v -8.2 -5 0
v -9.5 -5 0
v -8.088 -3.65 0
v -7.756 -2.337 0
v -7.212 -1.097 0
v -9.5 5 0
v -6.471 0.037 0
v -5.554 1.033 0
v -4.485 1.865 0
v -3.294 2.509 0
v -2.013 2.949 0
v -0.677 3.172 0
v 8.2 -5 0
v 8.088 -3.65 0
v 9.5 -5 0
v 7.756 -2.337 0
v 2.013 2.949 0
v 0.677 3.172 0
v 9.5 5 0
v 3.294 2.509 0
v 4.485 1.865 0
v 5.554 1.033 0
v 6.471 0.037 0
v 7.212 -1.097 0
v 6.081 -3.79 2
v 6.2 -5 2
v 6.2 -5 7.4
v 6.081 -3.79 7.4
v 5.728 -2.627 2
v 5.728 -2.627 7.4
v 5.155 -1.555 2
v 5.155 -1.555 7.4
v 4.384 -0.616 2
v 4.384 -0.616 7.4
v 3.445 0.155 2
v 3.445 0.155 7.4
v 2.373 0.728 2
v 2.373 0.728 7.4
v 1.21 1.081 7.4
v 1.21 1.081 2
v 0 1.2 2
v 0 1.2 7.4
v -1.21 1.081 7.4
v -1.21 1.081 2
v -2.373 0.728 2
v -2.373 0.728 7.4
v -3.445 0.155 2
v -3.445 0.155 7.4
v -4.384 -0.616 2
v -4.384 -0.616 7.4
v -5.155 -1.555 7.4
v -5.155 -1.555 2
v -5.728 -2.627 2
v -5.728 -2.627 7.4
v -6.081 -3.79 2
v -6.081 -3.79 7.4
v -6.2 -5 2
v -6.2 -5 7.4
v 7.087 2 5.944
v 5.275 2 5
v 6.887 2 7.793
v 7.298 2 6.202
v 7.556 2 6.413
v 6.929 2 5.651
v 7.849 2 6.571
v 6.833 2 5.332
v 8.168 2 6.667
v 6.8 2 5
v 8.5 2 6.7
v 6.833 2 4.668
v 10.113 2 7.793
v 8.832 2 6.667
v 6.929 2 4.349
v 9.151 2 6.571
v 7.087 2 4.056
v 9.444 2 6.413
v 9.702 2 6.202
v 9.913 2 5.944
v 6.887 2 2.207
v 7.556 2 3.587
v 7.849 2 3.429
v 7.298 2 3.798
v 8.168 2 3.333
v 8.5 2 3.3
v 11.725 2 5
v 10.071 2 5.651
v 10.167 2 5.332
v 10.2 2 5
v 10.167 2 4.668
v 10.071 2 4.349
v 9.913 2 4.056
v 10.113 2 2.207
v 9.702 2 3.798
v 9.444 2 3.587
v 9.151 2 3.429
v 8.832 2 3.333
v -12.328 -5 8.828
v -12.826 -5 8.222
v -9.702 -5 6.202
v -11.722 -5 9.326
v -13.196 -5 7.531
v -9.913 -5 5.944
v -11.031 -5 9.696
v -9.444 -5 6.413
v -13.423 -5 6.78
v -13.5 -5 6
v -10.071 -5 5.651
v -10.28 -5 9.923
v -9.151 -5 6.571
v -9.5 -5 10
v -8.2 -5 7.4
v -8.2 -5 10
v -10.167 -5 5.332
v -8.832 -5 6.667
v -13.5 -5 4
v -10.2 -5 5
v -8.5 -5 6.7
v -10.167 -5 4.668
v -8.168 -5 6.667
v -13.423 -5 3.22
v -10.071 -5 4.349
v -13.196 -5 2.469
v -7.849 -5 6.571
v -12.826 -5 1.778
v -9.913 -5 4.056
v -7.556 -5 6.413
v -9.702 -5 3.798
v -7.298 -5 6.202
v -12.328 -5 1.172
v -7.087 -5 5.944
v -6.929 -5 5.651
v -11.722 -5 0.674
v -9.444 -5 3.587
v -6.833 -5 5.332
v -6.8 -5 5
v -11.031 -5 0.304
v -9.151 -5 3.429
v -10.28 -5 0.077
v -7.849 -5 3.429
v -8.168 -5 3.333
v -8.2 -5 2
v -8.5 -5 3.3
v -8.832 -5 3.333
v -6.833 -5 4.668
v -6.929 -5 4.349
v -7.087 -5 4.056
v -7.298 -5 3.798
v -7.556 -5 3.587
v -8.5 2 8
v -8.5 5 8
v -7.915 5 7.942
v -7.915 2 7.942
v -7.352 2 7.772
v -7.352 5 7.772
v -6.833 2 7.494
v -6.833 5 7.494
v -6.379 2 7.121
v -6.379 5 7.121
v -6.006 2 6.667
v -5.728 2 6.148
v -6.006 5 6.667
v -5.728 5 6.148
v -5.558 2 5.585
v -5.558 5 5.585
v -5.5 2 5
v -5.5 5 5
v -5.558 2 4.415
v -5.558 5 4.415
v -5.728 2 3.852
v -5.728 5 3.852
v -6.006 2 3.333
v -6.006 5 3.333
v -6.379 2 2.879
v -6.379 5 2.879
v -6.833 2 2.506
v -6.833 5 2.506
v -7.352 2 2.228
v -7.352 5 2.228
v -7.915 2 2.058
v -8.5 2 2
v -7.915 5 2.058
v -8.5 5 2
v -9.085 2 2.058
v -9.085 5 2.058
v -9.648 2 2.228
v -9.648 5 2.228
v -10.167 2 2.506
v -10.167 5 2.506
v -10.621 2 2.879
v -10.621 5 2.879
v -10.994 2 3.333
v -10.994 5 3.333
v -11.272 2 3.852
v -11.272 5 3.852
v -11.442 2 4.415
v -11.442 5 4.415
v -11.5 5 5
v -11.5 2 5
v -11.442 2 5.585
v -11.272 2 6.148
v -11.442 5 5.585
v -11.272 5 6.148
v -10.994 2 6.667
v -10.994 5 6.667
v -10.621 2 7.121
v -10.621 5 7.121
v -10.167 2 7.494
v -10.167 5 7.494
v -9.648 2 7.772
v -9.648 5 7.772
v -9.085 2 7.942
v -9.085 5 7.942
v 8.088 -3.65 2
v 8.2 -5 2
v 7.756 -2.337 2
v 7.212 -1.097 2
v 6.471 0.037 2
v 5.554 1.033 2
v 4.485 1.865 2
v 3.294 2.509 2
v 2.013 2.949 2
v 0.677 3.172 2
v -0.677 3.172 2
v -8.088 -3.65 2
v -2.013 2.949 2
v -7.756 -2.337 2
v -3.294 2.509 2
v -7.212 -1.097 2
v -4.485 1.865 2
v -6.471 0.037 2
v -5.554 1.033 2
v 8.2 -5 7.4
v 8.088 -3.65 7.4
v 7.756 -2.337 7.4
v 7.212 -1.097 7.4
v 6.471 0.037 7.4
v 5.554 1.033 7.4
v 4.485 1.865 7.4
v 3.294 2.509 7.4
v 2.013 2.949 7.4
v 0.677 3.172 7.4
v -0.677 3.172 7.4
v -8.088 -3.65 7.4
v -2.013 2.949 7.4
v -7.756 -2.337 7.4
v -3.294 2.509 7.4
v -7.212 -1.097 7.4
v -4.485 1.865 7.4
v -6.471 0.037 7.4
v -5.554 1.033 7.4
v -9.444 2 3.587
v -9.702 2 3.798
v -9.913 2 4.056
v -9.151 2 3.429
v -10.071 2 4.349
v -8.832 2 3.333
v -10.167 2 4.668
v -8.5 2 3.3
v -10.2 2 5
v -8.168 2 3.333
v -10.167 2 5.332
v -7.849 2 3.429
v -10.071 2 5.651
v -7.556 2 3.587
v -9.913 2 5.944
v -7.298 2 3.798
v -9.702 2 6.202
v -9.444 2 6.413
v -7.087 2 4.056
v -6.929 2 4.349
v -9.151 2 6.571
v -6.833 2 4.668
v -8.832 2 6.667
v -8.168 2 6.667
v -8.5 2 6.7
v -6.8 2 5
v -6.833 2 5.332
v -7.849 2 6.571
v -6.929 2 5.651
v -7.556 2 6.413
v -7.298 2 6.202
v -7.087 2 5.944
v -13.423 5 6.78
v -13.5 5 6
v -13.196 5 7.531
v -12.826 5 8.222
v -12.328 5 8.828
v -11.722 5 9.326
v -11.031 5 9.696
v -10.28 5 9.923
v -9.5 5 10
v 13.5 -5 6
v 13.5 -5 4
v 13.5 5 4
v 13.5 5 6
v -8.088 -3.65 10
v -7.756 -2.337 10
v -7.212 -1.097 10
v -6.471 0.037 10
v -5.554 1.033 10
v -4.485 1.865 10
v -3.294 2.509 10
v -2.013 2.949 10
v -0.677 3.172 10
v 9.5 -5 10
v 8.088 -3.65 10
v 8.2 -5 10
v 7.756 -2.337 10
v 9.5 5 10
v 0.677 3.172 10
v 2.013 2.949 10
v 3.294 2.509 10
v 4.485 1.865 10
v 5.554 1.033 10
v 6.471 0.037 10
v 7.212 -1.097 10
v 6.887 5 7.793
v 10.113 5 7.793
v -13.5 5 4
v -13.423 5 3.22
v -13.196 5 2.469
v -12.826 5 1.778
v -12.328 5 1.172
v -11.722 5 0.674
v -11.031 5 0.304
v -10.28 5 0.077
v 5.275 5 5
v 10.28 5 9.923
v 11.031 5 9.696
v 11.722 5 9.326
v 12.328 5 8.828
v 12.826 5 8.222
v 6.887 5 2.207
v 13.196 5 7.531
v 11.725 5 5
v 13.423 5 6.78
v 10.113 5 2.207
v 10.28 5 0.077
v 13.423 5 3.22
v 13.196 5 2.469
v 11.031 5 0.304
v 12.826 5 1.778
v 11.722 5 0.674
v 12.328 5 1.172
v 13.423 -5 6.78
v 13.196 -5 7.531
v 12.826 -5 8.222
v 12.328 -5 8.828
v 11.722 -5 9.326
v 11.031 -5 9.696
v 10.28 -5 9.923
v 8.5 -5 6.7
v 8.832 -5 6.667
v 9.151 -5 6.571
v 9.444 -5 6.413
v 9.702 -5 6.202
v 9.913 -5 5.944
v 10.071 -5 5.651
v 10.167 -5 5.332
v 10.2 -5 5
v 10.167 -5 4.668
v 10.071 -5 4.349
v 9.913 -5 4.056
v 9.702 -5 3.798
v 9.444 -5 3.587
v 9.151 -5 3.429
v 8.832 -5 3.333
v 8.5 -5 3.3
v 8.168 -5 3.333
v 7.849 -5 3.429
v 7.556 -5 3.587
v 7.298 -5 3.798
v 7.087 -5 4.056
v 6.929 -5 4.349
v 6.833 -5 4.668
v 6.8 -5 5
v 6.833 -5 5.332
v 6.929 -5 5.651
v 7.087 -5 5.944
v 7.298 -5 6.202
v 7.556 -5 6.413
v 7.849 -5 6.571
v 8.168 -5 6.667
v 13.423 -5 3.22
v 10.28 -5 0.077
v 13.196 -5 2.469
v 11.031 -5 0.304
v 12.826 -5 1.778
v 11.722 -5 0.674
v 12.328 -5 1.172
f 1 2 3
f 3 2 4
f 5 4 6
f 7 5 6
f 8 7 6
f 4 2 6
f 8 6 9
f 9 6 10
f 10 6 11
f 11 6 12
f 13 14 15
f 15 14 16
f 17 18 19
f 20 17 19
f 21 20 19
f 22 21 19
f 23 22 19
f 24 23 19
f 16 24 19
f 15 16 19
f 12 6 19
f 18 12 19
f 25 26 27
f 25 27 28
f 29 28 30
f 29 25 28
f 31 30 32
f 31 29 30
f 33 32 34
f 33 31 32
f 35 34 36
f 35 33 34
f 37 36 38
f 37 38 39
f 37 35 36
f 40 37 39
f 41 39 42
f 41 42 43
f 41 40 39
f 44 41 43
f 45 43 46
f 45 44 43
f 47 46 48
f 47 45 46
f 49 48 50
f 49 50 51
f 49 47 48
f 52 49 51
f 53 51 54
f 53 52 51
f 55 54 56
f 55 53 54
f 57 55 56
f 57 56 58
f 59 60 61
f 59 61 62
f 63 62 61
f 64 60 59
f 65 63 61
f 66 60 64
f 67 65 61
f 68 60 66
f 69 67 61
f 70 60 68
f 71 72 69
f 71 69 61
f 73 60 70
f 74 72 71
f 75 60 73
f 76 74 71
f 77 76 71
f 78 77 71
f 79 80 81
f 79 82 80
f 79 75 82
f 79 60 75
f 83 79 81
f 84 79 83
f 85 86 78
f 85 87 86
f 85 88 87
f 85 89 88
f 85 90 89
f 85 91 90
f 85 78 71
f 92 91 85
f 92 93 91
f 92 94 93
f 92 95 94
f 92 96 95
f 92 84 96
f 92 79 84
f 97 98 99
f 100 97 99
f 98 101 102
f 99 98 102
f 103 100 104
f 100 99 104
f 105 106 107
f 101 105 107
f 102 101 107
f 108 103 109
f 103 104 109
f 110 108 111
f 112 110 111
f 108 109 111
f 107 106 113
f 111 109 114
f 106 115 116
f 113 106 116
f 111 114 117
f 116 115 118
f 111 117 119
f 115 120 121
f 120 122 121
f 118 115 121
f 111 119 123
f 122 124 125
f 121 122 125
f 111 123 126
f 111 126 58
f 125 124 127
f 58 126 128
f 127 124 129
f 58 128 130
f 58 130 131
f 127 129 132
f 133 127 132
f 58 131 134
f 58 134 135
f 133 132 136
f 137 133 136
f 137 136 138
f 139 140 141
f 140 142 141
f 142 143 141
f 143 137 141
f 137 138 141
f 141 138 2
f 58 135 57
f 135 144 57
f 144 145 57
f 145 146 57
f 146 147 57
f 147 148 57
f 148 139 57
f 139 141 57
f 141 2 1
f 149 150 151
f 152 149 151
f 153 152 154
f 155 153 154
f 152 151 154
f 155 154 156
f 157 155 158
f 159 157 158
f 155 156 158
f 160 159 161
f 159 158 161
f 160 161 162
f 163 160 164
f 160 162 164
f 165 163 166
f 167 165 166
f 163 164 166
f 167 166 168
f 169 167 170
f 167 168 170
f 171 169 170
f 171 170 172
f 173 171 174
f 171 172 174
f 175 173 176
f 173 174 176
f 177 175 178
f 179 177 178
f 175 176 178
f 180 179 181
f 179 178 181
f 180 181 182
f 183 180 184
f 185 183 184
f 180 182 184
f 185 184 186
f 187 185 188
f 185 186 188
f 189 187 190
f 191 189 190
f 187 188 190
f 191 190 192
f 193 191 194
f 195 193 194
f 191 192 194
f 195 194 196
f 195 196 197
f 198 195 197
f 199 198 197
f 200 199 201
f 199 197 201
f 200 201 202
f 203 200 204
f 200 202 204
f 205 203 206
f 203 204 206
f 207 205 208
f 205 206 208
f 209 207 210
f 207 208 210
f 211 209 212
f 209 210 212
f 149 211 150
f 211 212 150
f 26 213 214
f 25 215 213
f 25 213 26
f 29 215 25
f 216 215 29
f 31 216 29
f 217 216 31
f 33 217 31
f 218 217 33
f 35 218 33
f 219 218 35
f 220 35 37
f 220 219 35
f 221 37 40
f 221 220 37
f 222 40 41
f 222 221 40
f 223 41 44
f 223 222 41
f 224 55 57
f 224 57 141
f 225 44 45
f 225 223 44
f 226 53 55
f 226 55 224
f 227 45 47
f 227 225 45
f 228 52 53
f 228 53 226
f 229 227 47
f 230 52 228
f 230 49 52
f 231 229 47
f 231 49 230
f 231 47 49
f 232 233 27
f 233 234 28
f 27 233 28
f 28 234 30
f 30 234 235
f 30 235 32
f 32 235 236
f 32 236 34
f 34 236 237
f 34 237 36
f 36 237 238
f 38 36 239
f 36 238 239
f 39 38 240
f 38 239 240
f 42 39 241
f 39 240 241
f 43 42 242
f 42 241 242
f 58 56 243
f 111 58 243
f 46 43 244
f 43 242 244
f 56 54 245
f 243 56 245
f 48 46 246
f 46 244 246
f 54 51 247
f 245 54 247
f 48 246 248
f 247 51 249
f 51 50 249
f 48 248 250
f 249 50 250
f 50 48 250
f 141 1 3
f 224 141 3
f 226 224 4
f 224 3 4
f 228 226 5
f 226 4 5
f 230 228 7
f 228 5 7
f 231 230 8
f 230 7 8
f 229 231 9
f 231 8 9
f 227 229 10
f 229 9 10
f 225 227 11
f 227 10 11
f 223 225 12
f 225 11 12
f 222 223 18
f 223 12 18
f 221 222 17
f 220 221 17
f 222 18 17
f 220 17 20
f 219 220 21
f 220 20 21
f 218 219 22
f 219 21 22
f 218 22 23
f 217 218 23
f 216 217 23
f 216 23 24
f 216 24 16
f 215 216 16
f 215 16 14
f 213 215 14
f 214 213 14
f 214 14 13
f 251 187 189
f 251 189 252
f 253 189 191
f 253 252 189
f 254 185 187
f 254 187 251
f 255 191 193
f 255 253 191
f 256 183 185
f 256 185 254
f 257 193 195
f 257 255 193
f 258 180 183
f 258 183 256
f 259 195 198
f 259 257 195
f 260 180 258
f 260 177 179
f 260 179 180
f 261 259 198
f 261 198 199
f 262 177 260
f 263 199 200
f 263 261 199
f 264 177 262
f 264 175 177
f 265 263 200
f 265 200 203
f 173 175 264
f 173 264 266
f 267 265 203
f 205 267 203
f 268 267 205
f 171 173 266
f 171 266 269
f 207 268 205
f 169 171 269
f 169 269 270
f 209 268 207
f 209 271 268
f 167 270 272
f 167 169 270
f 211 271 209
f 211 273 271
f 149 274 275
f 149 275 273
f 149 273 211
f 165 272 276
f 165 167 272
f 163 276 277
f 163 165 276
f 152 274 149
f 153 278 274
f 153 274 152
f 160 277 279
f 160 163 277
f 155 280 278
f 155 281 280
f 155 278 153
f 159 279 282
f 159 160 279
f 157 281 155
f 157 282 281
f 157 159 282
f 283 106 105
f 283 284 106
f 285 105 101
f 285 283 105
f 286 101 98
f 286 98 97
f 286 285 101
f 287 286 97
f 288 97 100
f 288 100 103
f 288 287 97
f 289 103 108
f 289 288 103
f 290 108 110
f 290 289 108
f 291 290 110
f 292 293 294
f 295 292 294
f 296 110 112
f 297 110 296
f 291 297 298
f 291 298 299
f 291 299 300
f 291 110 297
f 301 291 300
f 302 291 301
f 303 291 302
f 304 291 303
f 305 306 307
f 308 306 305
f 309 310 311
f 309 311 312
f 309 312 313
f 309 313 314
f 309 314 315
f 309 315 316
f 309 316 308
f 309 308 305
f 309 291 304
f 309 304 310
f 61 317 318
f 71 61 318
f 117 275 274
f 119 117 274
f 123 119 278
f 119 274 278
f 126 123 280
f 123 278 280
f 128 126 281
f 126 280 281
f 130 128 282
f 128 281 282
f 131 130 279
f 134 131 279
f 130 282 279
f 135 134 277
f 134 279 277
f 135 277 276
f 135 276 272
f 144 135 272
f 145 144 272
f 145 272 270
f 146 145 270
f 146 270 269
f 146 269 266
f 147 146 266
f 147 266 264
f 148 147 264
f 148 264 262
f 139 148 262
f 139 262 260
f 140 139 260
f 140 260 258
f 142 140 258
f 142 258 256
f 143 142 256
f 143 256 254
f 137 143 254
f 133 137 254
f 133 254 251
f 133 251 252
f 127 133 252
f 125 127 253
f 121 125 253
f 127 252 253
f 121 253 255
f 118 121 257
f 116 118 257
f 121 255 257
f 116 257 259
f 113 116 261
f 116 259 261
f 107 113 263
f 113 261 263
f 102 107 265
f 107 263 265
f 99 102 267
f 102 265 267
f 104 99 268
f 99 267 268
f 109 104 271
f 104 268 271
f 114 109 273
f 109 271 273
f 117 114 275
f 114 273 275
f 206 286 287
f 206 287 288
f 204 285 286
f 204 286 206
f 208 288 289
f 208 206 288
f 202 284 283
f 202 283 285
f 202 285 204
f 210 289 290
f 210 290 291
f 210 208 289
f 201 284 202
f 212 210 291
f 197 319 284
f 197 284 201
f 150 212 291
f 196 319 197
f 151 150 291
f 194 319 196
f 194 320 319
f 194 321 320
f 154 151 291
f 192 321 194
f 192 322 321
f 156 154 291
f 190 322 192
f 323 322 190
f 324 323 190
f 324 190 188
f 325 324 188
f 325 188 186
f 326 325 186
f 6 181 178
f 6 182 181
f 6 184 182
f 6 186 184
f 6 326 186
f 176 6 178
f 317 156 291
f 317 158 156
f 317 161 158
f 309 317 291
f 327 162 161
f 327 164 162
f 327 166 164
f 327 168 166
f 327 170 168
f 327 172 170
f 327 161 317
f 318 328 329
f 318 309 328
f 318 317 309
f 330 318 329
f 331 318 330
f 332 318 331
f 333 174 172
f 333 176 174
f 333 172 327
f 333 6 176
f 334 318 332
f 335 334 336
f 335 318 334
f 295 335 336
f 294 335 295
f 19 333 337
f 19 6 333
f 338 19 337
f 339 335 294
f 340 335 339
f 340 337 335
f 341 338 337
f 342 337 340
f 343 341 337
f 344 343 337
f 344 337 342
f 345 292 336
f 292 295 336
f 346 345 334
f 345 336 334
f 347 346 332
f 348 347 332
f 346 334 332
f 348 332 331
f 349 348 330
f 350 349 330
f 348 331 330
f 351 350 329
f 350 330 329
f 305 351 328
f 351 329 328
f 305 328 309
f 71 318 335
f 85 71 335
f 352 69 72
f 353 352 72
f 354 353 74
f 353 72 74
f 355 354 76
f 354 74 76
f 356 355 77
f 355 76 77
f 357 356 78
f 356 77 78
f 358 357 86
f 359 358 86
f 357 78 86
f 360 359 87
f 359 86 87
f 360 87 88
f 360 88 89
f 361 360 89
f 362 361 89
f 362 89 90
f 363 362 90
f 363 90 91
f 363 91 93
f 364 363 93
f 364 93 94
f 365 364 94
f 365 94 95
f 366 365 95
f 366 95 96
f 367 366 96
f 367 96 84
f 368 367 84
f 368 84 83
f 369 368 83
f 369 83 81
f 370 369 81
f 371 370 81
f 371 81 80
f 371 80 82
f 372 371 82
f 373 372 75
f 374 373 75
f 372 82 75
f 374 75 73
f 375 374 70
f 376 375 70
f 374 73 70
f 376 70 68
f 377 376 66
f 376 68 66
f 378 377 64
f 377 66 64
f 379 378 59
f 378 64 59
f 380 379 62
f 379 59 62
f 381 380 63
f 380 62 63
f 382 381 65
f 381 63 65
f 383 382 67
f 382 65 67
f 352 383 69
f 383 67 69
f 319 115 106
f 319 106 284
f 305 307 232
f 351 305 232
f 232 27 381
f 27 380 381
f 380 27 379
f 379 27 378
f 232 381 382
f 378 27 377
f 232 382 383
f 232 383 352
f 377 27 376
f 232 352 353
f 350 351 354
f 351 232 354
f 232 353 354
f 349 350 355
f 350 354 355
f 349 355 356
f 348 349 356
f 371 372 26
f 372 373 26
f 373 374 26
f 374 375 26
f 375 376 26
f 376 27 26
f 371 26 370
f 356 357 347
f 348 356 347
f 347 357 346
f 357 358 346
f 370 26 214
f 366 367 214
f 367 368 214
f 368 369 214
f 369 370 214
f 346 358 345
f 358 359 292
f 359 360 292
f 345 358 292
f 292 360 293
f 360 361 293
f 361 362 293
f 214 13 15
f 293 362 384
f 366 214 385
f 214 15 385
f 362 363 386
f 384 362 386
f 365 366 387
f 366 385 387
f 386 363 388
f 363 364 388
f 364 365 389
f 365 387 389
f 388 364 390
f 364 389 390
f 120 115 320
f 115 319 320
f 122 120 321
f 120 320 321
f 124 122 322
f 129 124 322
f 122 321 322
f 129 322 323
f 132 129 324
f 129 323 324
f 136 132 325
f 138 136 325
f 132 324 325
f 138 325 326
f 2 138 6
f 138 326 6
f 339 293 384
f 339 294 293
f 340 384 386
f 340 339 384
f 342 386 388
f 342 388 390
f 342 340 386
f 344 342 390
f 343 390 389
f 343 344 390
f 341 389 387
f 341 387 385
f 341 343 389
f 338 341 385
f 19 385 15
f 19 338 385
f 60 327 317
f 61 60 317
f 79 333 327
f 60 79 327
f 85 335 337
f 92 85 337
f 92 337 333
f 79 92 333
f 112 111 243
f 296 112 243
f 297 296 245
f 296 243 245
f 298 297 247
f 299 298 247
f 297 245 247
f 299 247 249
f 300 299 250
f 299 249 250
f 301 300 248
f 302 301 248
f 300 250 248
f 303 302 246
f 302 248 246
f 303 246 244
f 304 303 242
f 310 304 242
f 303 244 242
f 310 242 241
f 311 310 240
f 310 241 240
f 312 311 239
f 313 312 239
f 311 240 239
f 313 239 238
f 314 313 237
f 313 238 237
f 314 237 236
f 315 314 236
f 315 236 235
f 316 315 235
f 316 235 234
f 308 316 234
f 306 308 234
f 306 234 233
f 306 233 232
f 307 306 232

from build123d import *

# Parameters (mm, degrees)
SKETCH1_W           = 27
SKETCH1_H           = 10
BOSS_EXTRUDE1_DEPTH = 10
FILLET1_R           = 4
SKETCH4_R           = 8.2
CUT_EXTRUDE3_DEPTH  = 18.528548143
BOSS_EXTRUDE2_START = 2
BOSS_EXTRUDE2_DEPTH = 5.4
SKETCH2_R           = 1.7
CUT_EXTRUDE1_DEPTH  = 20.551214796
SKETCH3_R           = 3
CUT_EXTRUDE2_DEPTH  = 3


with BuildPart() as part:
    # Sketch1 → Boss-Extrude1 (new body)
    with BuildSketch(Plane.XY):
        Rectangle(SKETCH1_W, SKETCH1_H)
    extrude(amount=BOSS_EXTRUDE1_DEPTH)

    # Fillet1
    fillet1_edges = [part.edges().sort_by_distance(p)[0] for p in [
        (-13.5, 0, 10),
        (13.5, 0, 10),
        (-13.5, 0, 0),
        (13.5, 0, 0),
    ]]
    fillet(fillet1_edges, radius=FILLET1_R)

    # Sketch4 → Cut-Extrude3 (cut, through all)
    with BuildSketch(Plane(origin=(0, 0, 0), x_dir=(-1, 0, 0), z_dir=(0, 0, -1))):
        with Locations((0, -5)):
            Circle(SKETCH4_R)
    extrude(amount=-CUT_EXTRUDE3_DEPTH, mode=Mode.SUBTRACT)

    # Sketch5 → Boss-Extrude2 (add)
    with BuildSketch(Plane.XY.offset(BOSS_EXTRUDE2_START)):
        with BuildLine():
            Line((8.2, -5), (6.2, -5))
            ThreePointArc((6.2, -5), (0, 1.2), (-6.2, -5))
            Line((-6.2, -5), (-8.2, -5))
            ThreePointArc((-8.2, -5), (0, 3.2), (8.2, -5))
        make_face()
    extrude(amount=BOSS_EXTRUDE2_DEPTH)

    # Sketch2 → Cut-Extrude1 (cut, through all)
    with BuildSketch(Plane(origin=(0, 5, 0), x_dir=(1, 0, 0), z_dir=(0, 1, 0))):
        with Locations(Location((-8.5, -5, 0), (0, 0, 270))):
            Circle(SKETCH2_R)
        with Locations(Location((8.5, -5, 0), (0, 0, 270))):
            Circle(SKETCH2_R)
    extrude(amount=-CUT_EXTRUDE1_DEPTH, mode=Mode.SUBTRACT)

    # Sketch3 → Cut-Extrude2 (cut)
    with BuildSketch(Plane(origin=(0, 5, 0), x_dir=(1, 0, 0), z_dir=(0, 1, 0))):
        with Locations(Location((-8.5, -5, 0), (0, 0, 270))):
            Circle(SKETCH3_R)
        Polygon((6.887284606, -7.793305), (10.112715394, -7.793305), (11.725430787, -5), (10.112715394, -2.206695), (6.887284606, -2.206695), (5.274569213, -5), align=None)
    extrude(amount=-CUT_EXTRUDE2_DEPTH, mode=Mode.SUBTRACT)


solid = part.part
